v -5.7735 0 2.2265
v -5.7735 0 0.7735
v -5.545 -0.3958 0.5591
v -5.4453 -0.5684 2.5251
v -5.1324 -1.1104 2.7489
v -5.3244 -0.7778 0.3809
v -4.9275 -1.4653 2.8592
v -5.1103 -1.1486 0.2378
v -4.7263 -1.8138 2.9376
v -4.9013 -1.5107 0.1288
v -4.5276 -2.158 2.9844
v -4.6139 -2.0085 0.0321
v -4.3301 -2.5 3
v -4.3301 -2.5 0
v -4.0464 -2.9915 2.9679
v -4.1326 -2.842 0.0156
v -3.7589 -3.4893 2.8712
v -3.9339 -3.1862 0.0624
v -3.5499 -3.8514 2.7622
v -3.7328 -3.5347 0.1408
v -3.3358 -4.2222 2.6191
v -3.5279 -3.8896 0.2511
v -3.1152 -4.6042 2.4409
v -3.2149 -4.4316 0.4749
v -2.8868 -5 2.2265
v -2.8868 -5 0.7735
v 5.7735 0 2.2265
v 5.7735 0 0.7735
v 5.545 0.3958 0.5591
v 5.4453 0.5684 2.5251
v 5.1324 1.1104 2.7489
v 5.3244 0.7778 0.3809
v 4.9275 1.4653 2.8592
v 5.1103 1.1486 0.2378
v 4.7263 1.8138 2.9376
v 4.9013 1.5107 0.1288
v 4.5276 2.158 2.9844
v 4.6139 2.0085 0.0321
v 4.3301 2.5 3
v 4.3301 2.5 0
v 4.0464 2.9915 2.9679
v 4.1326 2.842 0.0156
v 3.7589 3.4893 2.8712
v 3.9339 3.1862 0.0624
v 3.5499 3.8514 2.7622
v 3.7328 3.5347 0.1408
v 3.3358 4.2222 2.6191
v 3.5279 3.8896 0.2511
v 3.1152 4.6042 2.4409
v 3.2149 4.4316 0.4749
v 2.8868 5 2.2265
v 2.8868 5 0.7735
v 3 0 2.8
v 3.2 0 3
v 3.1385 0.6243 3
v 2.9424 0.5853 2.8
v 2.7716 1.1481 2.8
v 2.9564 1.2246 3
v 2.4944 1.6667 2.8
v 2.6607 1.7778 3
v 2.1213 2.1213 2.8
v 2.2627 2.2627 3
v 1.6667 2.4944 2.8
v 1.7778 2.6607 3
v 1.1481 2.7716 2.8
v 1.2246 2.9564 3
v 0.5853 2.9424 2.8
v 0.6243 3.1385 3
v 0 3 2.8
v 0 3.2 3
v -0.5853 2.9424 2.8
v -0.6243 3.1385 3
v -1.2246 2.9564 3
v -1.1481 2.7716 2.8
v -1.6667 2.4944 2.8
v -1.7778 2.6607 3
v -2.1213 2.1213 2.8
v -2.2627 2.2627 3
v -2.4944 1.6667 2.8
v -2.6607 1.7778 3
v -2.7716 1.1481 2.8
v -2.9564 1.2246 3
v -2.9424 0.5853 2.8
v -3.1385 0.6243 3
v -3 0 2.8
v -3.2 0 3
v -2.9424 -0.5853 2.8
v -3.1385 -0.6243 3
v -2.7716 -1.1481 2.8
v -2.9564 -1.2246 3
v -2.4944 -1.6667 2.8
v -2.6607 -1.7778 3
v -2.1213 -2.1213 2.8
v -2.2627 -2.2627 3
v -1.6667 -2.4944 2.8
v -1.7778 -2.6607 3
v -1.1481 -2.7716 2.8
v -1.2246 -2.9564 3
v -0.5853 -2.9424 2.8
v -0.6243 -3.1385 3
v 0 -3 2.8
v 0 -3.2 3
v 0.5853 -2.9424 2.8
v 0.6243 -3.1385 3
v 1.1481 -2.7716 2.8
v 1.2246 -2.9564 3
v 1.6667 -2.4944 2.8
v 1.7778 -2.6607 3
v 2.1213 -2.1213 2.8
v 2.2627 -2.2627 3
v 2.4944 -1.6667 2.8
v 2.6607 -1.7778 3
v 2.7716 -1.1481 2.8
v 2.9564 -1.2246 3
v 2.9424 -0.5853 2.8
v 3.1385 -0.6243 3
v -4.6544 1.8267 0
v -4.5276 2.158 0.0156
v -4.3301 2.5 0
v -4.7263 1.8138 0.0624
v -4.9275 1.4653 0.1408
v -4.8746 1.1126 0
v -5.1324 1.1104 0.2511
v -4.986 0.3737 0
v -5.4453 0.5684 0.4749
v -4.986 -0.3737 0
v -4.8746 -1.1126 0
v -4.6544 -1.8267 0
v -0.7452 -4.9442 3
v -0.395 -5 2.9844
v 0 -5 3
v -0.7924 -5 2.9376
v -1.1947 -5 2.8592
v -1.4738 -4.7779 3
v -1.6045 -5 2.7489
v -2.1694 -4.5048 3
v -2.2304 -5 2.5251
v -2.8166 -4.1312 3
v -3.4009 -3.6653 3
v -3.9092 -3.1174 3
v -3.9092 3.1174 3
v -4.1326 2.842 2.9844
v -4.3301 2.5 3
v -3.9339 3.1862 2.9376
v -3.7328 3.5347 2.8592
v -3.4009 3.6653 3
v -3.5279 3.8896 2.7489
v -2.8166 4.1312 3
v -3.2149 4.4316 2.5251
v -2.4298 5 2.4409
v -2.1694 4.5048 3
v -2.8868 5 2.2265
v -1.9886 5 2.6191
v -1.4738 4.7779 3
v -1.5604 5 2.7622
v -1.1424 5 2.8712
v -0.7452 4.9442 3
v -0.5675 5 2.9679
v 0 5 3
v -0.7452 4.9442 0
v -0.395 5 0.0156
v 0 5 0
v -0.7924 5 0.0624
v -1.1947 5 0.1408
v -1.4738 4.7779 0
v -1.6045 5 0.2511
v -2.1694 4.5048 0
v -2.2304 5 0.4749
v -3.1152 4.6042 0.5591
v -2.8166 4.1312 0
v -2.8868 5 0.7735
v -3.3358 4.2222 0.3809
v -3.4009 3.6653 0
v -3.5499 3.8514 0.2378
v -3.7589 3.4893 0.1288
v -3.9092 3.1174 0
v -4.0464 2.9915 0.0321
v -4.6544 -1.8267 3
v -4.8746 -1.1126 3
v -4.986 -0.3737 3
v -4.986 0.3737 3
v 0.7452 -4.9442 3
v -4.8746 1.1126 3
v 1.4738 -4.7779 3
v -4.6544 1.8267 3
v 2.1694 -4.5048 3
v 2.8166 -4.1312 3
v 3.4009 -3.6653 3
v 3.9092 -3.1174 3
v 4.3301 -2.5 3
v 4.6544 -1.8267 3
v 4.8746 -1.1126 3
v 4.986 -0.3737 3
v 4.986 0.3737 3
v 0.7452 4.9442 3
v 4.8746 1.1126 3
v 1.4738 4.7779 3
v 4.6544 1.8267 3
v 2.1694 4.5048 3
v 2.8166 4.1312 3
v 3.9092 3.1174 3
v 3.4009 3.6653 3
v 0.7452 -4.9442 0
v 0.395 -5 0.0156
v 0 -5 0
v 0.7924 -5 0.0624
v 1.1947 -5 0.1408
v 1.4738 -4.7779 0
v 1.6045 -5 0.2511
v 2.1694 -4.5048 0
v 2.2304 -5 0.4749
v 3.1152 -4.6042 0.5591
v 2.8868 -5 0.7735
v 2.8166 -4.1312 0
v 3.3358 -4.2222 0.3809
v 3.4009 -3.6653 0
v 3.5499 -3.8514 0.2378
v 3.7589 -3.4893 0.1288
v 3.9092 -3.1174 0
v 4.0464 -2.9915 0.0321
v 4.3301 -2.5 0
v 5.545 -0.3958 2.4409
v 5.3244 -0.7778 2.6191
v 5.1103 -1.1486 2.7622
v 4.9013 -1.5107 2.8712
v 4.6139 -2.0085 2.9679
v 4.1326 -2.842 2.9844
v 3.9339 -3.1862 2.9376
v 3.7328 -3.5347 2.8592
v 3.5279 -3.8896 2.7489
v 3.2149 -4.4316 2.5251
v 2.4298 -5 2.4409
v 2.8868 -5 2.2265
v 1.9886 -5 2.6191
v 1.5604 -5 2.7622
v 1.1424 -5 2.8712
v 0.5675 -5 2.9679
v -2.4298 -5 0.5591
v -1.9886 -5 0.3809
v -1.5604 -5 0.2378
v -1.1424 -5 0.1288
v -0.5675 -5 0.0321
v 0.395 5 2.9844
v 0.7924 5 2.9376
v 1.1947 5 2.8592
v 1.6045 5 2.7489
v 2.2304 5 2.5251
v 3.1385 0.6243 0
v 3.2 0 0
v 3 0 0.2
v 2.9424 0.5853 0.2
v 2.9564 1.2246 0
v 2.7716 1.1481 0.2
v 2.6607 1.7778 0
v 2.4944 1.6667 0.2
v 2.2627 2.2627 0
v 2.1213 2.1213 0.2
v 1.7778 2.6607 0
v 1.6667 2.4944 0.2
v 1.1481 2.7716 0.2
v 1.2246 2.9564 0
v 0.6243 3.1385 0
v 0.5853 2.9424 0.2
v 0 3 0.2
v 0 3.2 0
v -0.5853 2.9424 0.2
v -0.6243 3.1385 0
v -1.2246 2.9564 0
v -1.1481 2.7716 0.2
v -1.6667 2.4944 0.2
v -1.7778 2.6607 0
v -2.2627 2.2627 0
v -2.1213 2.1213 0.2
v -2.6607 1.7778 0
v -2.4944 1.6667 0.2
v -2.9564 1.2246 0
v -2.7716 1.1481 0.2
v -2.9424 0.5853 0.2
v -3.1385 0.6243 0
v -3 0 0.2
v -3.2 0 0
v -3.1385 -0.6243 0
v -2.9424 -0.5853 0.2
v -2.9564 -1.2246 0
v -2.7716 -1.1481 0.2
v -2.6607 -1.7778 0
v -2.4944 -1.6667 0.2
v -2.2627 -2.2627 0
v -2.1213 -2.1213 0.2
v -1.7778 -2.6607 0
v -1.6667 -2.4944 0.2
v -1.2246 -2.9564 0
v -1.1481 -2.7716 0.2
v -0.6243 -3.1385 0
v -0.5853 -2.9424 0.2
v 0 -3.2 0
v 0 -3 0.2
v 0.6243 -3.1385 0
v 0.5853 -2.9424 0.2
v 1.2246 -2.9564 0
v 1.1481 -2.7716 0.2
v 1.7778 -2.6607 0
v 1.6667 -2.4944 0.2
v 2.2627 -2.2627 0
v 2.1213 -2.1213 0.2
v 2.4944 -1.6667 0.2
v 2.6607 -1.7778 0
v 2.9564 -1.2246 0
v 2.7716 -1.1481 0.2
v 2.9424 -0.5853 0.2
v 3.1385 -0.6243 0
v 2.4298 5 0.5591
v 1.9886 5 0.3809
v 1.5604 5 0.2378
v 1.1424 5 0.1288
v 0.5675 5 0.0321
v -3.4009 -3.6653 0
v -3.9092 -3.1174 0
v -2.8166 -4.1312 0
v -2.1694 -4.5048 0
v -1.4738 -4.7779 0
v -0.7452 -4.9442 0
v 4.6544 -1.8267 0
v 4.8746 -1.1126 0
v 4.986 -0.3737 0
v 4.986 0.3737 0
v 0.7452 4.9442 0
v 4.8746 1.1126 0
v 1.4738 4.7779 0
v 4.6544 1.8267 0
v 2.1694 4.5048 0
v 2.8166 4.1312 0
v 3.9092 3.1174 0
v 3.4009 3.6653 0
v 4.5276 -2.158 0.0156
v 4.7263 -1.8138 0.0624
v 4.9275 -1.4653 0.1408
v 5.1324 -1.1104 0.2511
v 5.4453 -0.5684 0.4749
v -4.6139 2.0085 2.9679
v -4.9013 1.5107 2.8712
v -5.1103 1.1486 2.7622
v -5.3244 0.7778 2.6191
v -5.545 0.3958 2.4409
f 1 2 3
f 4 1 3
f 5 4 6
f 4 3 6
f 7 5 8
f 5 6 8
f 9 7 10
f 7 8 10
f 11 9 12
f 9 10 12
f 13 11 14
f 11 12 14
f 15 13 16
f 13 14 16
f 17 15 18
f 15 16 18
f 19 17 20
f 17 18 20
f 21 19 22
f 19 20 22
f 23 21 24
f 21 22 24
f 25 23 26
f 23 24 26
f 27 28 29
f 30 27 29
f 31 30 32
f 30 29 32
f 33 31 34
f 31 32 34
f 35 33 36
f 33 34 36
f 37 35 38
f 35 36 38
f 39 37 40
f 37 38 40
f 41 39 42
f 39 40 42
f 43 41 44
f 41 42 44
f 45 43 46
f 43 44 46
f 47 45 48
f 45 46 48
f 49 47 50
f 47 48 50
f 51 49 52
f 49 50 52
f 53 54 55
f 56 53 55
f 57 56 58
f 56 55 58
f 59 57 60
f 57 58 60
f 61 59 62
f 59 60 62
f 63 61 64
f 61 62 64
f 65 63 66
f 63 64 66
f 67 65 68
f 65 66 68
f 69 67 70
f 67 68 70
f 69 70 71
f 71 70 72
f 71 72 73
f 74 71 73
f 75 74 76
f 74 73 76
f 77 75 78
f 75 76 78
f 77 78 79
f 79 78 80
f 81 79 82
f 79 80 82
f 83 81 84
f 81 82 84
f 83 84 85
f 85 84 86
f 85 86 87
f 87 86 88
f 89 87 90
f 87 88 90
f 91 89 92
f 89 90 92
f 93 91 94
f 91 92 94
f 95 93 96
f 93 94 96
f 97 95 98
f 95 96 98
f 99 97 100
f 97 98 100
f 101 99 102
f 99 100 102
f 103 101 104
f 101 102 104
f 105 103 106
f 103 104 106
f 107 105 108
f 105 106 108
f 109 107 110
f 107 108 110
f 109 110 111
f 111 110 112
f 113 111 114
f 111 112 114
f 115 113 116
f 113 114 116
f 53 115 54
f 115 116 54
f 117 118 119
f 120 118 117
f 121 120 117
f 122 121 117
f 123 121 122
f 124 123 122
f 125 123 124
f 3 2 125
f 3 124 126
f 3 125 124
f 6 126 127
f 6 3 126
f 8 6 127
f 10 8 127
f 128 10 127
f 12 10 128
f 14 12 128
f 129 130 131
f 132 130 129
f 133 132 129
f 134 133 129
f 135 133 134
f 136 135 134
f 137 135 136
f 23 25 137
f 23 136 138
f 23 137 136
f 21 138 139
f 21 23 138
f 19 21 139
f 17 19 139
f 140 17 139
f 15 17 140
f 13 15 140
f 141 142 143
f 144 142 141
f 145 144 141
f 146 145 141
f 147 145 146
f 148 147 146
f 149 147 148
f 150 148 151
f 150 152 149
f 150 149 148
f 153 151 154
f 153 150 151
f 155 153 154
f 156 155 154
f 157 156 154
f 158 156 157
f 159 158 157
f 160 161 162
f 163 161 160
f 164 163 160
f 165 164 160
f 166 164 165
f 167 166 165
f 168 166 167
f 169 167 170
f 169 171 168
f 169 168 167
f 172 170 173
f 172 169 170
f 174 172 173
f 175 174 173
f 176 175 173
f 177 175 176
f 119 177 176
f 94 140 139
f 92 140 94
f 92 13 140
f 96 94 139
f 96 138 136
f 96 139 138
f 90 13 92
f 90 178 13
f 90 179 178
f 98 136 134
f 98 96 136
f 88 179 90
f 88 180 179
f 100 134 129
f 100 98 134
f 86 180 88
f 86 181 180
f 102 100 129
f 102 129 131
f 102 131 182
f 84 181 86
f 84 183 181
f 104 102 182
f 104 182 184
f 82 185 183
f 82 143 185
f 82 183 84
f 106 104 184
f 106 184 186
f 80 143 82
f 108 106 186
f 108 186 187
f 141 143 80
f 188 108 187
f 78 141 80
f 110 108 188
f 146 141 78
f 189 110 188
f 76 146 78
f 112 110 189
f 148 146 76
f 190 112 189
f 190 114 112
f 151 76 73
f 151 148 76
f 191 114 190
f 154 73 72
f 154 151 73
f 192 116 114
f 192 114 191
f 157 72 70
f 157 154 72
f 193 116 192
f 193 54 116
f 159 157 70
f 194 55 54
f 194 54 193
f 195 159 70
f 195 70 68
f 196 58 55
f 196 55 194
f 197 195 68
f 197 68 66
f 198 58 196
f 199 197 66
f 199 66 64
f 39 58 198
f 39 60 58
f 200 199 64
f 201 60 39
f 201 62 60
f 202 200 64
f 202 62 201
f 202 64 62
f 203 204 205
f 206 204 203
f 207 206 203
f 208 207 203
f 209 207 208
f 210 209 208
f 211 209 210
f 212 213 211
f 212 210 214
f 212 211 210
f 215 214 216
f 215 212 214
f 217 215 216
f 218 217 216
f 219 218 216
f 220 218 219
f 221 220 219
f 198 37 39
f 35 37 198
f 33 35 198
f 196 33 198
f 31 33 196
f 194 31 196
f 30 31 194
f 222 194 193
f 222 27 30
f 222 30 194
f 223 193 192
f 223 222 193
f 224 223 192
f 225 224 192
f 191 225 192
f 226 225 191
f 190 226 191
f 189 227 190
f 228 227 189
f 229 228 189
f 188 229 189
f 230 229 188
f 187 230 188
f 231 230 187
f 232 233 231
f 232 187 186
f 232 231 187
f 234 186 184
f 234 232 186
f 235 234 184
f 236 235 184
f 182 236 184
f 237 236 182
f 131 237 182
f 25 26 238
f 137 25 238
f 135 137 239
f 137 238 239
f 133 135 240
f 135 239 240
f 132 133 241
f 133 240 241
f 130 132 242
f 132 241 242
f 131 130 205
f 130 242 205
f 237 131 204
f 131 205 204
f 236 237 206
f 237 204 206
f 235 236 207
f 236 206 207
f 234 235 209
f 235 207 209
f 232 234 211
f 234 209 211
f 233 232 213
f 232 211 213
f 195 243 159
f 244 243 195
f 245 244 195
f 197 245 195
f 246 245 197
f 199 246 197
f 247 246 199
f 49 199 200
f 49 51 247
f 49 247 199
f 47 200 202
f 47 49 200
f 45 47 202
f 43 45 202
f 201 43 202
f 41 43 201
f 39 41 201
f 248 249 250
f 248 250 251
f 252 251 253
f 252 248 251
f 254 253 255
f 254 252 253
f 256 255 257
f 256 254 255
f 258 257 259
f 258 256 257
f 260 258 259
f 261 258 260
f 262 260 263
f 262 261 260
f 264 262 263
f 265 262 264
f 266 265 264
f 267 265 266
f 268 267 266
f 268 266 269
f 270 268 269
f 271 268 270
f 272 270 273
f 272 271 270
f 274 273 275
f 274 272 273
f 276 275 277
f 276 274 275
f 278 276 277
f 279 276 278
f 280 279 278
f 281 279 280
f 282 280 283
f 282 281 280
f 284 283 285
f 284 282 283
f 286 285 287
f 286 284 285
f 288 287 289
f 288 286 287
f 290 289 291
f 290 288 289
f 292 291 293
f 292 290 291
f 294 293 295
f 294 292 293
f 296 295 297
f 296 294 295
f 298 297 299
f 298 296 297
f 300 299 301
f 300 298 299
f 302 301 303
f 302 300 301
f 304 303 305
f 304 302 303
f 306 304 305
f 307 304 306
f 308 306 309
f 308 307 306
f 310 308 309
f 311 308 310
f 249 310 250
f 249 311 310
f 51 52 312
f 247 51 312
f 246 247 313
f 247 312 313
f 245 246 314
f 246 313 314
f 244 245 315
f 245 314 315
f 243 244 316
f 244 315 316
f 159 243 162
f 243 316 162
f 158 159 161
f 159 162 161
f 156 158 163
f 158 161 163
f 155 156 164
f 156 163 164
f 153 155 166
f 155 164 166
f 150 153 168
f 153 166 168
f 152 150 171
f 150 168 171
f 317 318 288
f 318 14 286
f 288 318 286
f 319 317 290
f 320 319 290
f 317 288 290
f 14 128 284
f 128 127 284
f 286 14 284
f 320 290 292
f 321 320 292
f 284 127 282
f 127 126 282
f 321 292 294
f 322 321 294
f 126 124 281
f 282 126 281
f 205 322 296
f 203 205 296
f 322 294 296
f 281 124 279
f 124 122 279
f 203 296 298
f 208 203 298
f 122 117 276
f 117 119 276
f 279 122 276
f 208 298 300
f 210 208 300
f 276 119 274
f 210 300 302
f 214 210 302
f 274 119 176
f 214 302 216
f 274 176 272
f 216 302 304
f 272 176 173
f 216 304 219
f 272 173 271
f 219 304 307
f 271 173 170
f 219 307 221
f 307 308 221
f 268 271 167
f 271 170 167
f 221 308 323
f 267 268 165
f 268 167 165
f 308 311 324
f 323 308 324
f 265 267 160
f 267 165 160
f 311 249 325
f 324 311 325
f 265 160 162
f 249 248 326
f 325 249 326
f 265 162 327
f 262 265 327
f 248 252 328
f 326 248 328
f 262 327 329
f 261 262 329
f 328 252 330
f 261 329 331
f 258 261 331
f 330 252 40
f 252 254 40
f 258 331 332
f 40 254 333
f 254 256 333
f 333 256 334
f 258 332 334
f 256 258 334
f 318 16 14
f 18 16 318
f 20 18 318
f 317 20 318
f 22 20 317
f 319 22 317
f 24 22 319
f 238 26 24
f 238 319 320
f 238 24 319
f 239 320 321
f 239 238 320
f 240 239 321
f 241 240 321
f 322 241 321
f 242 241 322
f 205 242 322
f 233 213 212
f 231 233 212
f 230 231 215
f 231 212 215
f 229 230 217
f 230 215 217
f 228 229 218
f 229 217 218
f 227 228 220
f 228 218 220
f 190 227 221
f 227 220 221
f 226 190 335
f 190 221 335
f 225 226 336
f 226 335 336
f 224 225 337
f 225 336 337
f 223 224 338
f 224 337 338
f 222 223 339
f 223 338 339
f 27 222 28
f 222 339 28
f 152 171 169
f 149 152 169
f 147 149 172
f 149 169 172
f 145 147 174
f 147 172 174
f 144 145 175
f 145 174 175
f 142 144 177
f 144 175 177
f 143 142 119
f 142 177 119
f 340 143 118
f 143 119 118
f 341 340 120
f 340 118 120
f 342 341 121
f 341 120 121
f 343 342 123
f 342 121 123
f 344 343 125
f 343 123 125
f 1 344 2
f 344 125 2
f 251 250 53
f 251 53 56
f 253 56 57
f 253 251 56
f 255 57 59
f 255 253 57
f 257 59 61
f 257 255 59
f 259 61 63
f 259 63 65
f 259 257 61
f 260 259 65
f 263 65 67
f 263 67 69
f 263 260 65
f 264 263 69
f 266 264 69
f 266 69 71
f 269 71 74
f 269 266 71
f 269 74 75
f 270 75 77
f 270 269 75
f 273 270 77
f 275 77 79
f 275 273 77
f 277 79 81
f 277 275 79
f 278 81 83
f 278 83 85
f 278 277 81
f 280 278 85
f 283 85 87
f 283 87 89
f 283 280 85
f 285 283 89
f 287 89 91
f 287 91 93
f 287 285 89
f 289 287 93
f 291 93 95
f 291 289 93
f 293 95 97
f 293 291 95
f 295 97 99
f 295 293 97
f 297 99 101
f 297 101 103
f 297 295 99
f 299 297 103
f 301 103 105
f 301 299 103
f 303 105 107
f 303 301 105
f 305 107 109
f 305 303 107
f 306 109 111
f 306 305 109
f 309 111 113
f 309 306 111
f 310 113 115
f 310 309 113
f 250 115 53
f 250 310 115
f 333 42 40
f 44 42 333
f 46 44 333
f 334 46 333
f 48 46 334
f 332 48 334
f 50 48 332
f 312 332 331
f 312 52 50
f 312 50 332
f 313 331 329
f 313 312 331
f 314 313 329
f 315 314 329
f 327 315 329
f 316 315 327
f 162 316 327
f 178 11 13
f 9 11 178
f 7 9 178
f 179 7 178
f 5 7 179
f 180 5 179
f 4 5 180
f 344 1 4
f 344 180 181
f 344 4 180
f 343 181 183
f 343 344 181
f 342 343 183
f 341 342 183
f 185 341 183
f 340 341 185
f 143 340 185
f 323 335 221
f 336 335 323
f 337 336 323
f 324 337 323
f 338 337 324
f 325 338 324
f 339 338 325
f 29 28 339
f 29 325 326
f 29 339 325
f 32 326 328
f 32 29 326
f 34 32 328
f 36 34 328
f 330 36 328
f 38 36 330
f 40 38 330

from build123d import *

# Parameters (mm, degrees)
SKETCH_1_R          = 3
EXTRUDE_1_DEPTH     = 3
CHAMFER_1_SIZE      = 0.2
SKETCH_2_OUTSIDE_W  = 22.662
SKETCH_2_OUTSIDE_H  = 21.114
SKETCH_2_OUTSIDE_R  = 5
CUT_EXTRUDE_1_DEPTH = 3
CUT_EXTRUDE_1_TAPER = 45
SKETCH_3_OUTSIDE_W  = 22.662
SKETCH_3_OUTSIDE_H  = 21.114
SKETCH_3_OUTSIDE_R  = 5
CUT_EXTRUDE_2_DEPTH = 3
CUT_EXTRUDE_2_TAPER = 45


with BuildPart() as part:
    # Эскиз1 → Бобышка-Вытянуть1 (new body)
    with BuildSketch(Plane.XY):
        Polygon((5.773502692, 0), (2.886751346, 5), (-2.886751346, 5), (-5.773502692, 0), (-2.886751346, -5), (2.886751346, -5), align=None)
        Circle(SKETCH_1_R, mode=Mode.SUBTRACT)
    extrude(amount=EXTRUDE_1_DEPTH)

    # Фаска1
    chamfer_1_edges = [part.edges().sort_by_distance(p)[0] for p in [
        (-3, 0, 0),
        (-3, 0, 3),
    ]]
    chamfer(chamfer_1_edges, length=CHAMFER_1_SIZE)

    # Эскиз2 outside → Вырез-Вытянуть1 (cut)
    with BuildSketch(Plane.XY.offset(3)):
        Rectangle(SKETCH_2_OUTSIDE_W, SKETCH_2_OUTSIDE_H)
        Circle(SKETCH_2_OUTSIDE_R, mode=Mode.SUBTRACT)
    extrude(amount=-CUT_EXTRUDE_1_DEPTH, taper=CUT_EXTRUDE_1_TAPER, mode=Mode.SUBTRACT)

    # Эскиз3 outside → Вырез-Вытянуть2 (cut)
    with BuildSketch(Plane(origin=(0, 0, 0), x_dir=(-1, 0, 0), z_dir=(0, 0, -1))):
        Rectangle(SKETCH_3_OUTSIDE_W, SKETCH_3_OUTSIDE_H)
        Circle(SKETCH_3_OUTSIDE_R, mode=Mode.SUBTRACT)
    extrude(amount=-CUT_EXTRUDE_2_DEPTH, taper=CUT_EXTRUDE_2_TAPER, mode=Mode.SUBTRACT)


solid = part.part
